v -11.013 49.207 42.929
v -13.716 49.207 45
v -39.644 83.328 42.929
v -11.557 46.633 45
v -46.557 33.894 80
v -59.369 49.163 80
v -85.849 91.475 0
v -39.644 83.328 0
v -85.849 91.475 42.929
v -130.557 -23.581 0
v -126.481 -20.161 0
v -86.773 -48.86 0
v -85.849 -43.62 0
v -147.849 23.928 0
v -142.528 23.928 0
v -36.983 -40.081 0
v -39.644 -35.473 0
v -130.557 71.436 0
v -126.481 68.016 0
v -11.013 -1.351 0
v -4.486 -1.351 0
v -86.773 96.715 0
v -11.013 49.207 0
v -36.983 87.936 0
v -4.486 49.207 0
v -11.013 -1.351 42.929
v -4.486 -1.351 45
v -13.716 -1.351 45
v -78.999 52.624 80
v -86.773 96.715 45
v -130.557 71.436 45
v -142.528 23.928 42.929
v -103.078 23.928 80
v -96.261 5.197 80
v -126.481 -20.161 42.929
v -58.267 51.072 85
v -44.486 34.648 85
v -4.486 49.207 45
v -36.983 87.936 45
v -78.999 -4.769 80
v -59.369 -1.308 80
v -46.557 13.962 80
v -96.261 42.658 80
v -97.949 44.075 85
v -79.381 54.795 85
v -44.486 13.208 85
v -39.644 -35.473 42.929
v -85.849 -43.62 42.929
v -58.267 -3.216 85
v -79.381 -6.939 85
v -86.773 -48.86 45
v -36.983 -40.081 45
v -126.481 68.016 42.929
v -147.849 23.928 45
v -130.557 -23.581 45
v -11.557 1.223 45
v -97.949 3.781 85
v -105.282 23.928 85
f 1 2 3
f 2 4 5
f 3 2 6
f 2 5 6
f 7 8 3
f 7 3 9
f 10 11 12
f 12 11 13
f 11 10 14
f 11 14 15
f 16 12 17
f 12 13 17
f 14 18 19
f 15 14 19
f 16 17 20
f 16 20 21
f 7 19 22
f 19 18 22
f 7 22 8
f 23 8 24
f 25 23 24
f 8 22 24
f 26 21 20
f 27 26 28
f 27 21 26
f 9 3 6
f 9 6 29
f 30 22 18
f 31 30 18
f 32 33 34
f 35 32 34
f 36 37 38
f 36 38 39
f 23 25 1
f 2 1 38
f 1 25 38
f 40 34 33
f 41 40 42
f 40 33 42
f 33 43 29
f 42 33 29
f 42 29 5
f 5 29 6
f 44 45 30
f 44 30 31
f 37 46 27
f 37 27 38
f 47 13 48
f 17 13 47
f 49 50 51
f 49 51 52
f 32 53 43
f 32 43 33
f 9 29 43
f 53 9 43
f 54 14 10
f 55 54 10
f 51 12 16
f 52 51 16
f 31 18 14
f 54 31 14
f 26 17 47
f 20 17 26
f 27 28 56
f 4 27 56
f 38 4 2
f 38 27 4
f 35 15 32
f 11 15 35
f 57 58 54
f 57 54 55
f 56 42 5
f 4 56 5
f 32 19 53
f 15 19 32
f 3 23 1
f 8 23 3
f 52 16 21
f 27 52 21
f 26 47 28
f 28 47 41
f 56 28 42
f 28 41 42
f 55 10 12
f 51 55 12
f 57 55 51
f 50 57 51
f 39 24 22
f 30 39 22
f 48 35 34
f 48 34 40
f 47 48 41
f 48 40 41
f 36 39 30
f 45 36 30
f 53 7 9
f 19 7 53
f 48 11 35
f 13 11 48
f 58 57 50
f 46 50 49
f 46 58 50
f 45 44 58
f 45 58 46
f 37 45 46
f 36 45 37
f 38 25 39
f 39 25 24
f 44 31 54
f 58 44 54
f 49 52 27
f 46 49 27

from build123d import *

# Parameters (mm, degrees)
F1_DEPTH = 85
F2_SIZE  = 40
F3_T     = -5
F4_W     = 50.557665
F4_H     = 45
F5_DEPTH = 70


with BuildPart() as f1:
    # F0 (on Top) → F1 (new body)
    with BuildSketch(Plane.XY):
        Polygon((-4.485587, -1.35111), (-4.485587, 49.206555), (-36.983427, 87.935973), (-86.773008, 96.715219), (-130.55723, 71.436387), (-147.84897, 23.927722), (-130.55723, -23.580943), (-86.773008, -48.859775), (-36.983427, -40.080529), align=None)
    extrude(amount=F1_DEPTH)

    # F2
    f2_edges = [f1.edges().sort_by_distance(p)[0] for p in [
        (-20.734507, -20.71582, 85),
        (-4.485587, 23.927722, 85),
        (-20.734507, 68.571264, 85),
        (-61.878218, 92.325596, 85),
        (-108.665119, 84.075803, 85),
        (-139.2031, 47.682054, 85),
        (-139.2031, 0.17339, 85),
        (-108.665119, -36.220359, 85),
        (-61.878218, -44.470152, 85),
    ]]
    chamfer(f2_edges, length=F2_SIZE)

    # F3
    f3_openings = [f1.faces().sort_by_distance(p)[0] for p in [
        (-73.938608, 23.927722, 0),
    ]]
    offset(amount=F3_T, openings=f3_openings)

    # F4 (on face) → F5 (cut)
    with BuildSketch(Plane.YZ.offset(-4.485587)):
        with Locations((23.927722, 22.5)):
            Rectangle(F4_W, F4_H)
    extrude(amount=-F5_DEPTH, mode=Mode.SUBTRACT)


solid = f1.part
